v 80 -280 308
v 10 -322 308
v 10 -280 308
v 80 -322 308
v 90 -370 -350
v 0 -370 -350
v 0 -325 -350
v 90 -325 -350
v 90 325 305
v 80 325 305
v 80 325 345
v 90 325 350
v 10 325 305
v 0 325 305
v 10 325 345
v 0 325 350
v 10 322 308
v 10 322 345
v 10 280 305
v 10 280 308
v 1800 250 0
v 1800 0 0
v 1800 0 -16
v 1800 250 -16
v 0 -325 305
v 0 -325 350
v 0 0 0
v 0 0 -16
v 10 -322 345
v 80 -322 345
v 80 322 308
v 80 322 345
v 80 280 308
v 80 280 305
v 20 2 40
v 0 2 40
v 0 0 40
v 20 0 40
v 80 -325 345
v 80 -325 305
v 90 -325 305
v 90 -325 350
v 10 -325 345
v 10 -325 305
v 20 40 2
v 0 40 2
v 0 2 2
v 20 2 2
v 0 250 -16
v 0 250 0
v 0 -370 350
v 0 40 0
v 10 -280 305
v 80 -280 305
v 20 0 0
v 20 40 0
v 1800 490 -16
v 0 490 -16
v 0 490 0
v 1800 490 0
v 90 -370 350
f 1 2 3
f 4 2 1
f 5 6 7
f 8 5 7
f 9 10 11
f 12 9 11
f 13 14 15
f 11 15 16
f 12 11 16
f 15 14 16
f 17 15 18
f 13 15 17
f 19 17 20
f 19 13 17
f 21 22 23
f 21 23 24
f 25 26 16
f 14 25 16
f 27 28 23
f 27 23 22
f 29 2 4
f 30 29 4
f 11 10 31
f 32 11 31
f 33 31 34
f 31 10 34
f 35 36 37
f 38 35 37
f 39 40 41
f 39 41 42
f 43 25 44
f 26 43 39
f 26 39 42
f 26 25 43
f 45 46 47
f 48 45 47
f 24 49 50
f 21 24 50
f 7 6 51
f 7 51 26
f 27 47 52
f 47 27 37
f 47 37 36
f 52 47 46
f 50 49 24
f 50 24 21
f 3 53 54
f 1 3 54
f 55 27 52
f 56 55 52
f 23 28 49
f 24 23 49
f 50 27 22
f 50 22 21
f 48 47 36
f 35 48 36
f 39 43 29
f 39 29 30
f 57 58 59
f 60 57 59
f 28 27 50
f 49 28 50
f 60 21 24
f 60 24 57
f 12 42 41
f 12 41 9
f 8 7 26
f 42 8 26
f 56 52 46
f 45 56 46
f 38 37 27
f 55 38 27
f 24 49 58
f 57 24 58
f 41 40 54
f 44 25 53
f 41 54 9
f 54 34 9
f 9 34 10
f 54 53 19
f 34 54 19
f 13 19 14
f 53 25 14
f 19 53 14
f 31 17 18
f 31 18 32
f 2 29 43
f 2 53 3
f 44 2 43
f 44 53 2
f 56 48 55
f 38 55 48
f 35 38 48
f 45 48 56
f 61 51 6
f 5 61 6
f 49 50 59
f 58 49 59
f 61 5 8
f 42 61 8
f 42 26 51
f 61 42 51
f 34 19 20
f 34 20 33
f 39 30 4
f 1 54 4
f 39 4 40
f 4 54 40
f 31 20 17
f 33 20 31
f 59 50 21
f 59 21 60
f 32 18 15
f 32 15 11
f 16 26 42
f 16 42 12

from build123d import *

# Parameters (mm, degrees)
F1_DEPTH  = 90
F0_W      = 650
F0_H      = 45
F2_DEPTH  = 90
F3_W      = 70
F3_H      = 3
F4_DEPTH  = 40
F5_W      = 70
F5_H      = 42
F6_DEPTH  = 3
F8_DEPTH  = 20
F9_W      = 250
F9_H      = 16
F10_DEPTH = 1800
F9_W_2    = 240
F11_DEPTH = 1800


with BuildPart() as f1:
    # F0 (on Right) → F1 (new body)
    with BuildSketch(Plane.YZ):
        Polygon((-325, 350), (-370, 350), (-370, -350), (-325, -350), (-325, -305), (-325, 305), align=None)
    extrude(amount=F1_DEPTH)


with BuildPart() as f2:
    # F0 (on Right) → F2 (new body, through all)
    with BuildSketch(Plane.YZ):
        with Locations((0, 327.5)):
            Rectangle(F0_W, F0_H)
    extrude(amount=F2_DEPTH)

    # F3 (on face) → F4 (cut)
    with BuildSketch(Plane(origin=(0, 0, 305), x_dir=(1, 0, 0), z_dir=(0, 0, -1))):
        with Locations((45, 323.5)):
            Rectangle(F3_W, F3_H)
        with Locations((45, -323.5)):
            Rectangle(F3_W, F3_H)
    extrude(amount=-F4_DEPTH, mode=Mode.SUBTRACT)

    # F5 (on face) → F6 (cut)
    with BuildSketch(Plane(origin=(0, 0, 305), x_dir=(1, 0, 0), z_dir=(0, 0, -1))):
        with Locations((45, 301)):
            Rectangle(F5_W, F5_H)
        with Locations((45, -301)):
            Rectangle(F5_W, F5_H)
    extrude(amount=-F6_DEPTH, mode=Mode.SUBTRACT)


with BuildPart() as f8:
    # F7 (on Right) → F8 (new body)
    with BuildSketch(Plane.YZ):
        Polygon((2, 40), (0, 40), (0, 0), (40, 0), (40, 2), (2, 2), align=None)
    extrude(amount=F8_DEPTH)


with BuildPart() as f10:
    # F9 (on Right) → F10 (new body)
    with BuildSketch(Plane.YZ):
        with Locations((125, -8)):
            Rectangle(F9_W, F9_H)
    extrude(amount=F10_DEPTH)


with BuildPart() as f11:
    # F9 (on Right) → F11 (new body)
    with BuildSketch(Plane.YZ):
        with Locations((370, -8)):
            Rectangle(F9_W_2, F9_H)
    extrude(amount=F11_DEPTH)


solid = Compound([f1.part, f2.part, f8.part, f10.part, f11.part])
